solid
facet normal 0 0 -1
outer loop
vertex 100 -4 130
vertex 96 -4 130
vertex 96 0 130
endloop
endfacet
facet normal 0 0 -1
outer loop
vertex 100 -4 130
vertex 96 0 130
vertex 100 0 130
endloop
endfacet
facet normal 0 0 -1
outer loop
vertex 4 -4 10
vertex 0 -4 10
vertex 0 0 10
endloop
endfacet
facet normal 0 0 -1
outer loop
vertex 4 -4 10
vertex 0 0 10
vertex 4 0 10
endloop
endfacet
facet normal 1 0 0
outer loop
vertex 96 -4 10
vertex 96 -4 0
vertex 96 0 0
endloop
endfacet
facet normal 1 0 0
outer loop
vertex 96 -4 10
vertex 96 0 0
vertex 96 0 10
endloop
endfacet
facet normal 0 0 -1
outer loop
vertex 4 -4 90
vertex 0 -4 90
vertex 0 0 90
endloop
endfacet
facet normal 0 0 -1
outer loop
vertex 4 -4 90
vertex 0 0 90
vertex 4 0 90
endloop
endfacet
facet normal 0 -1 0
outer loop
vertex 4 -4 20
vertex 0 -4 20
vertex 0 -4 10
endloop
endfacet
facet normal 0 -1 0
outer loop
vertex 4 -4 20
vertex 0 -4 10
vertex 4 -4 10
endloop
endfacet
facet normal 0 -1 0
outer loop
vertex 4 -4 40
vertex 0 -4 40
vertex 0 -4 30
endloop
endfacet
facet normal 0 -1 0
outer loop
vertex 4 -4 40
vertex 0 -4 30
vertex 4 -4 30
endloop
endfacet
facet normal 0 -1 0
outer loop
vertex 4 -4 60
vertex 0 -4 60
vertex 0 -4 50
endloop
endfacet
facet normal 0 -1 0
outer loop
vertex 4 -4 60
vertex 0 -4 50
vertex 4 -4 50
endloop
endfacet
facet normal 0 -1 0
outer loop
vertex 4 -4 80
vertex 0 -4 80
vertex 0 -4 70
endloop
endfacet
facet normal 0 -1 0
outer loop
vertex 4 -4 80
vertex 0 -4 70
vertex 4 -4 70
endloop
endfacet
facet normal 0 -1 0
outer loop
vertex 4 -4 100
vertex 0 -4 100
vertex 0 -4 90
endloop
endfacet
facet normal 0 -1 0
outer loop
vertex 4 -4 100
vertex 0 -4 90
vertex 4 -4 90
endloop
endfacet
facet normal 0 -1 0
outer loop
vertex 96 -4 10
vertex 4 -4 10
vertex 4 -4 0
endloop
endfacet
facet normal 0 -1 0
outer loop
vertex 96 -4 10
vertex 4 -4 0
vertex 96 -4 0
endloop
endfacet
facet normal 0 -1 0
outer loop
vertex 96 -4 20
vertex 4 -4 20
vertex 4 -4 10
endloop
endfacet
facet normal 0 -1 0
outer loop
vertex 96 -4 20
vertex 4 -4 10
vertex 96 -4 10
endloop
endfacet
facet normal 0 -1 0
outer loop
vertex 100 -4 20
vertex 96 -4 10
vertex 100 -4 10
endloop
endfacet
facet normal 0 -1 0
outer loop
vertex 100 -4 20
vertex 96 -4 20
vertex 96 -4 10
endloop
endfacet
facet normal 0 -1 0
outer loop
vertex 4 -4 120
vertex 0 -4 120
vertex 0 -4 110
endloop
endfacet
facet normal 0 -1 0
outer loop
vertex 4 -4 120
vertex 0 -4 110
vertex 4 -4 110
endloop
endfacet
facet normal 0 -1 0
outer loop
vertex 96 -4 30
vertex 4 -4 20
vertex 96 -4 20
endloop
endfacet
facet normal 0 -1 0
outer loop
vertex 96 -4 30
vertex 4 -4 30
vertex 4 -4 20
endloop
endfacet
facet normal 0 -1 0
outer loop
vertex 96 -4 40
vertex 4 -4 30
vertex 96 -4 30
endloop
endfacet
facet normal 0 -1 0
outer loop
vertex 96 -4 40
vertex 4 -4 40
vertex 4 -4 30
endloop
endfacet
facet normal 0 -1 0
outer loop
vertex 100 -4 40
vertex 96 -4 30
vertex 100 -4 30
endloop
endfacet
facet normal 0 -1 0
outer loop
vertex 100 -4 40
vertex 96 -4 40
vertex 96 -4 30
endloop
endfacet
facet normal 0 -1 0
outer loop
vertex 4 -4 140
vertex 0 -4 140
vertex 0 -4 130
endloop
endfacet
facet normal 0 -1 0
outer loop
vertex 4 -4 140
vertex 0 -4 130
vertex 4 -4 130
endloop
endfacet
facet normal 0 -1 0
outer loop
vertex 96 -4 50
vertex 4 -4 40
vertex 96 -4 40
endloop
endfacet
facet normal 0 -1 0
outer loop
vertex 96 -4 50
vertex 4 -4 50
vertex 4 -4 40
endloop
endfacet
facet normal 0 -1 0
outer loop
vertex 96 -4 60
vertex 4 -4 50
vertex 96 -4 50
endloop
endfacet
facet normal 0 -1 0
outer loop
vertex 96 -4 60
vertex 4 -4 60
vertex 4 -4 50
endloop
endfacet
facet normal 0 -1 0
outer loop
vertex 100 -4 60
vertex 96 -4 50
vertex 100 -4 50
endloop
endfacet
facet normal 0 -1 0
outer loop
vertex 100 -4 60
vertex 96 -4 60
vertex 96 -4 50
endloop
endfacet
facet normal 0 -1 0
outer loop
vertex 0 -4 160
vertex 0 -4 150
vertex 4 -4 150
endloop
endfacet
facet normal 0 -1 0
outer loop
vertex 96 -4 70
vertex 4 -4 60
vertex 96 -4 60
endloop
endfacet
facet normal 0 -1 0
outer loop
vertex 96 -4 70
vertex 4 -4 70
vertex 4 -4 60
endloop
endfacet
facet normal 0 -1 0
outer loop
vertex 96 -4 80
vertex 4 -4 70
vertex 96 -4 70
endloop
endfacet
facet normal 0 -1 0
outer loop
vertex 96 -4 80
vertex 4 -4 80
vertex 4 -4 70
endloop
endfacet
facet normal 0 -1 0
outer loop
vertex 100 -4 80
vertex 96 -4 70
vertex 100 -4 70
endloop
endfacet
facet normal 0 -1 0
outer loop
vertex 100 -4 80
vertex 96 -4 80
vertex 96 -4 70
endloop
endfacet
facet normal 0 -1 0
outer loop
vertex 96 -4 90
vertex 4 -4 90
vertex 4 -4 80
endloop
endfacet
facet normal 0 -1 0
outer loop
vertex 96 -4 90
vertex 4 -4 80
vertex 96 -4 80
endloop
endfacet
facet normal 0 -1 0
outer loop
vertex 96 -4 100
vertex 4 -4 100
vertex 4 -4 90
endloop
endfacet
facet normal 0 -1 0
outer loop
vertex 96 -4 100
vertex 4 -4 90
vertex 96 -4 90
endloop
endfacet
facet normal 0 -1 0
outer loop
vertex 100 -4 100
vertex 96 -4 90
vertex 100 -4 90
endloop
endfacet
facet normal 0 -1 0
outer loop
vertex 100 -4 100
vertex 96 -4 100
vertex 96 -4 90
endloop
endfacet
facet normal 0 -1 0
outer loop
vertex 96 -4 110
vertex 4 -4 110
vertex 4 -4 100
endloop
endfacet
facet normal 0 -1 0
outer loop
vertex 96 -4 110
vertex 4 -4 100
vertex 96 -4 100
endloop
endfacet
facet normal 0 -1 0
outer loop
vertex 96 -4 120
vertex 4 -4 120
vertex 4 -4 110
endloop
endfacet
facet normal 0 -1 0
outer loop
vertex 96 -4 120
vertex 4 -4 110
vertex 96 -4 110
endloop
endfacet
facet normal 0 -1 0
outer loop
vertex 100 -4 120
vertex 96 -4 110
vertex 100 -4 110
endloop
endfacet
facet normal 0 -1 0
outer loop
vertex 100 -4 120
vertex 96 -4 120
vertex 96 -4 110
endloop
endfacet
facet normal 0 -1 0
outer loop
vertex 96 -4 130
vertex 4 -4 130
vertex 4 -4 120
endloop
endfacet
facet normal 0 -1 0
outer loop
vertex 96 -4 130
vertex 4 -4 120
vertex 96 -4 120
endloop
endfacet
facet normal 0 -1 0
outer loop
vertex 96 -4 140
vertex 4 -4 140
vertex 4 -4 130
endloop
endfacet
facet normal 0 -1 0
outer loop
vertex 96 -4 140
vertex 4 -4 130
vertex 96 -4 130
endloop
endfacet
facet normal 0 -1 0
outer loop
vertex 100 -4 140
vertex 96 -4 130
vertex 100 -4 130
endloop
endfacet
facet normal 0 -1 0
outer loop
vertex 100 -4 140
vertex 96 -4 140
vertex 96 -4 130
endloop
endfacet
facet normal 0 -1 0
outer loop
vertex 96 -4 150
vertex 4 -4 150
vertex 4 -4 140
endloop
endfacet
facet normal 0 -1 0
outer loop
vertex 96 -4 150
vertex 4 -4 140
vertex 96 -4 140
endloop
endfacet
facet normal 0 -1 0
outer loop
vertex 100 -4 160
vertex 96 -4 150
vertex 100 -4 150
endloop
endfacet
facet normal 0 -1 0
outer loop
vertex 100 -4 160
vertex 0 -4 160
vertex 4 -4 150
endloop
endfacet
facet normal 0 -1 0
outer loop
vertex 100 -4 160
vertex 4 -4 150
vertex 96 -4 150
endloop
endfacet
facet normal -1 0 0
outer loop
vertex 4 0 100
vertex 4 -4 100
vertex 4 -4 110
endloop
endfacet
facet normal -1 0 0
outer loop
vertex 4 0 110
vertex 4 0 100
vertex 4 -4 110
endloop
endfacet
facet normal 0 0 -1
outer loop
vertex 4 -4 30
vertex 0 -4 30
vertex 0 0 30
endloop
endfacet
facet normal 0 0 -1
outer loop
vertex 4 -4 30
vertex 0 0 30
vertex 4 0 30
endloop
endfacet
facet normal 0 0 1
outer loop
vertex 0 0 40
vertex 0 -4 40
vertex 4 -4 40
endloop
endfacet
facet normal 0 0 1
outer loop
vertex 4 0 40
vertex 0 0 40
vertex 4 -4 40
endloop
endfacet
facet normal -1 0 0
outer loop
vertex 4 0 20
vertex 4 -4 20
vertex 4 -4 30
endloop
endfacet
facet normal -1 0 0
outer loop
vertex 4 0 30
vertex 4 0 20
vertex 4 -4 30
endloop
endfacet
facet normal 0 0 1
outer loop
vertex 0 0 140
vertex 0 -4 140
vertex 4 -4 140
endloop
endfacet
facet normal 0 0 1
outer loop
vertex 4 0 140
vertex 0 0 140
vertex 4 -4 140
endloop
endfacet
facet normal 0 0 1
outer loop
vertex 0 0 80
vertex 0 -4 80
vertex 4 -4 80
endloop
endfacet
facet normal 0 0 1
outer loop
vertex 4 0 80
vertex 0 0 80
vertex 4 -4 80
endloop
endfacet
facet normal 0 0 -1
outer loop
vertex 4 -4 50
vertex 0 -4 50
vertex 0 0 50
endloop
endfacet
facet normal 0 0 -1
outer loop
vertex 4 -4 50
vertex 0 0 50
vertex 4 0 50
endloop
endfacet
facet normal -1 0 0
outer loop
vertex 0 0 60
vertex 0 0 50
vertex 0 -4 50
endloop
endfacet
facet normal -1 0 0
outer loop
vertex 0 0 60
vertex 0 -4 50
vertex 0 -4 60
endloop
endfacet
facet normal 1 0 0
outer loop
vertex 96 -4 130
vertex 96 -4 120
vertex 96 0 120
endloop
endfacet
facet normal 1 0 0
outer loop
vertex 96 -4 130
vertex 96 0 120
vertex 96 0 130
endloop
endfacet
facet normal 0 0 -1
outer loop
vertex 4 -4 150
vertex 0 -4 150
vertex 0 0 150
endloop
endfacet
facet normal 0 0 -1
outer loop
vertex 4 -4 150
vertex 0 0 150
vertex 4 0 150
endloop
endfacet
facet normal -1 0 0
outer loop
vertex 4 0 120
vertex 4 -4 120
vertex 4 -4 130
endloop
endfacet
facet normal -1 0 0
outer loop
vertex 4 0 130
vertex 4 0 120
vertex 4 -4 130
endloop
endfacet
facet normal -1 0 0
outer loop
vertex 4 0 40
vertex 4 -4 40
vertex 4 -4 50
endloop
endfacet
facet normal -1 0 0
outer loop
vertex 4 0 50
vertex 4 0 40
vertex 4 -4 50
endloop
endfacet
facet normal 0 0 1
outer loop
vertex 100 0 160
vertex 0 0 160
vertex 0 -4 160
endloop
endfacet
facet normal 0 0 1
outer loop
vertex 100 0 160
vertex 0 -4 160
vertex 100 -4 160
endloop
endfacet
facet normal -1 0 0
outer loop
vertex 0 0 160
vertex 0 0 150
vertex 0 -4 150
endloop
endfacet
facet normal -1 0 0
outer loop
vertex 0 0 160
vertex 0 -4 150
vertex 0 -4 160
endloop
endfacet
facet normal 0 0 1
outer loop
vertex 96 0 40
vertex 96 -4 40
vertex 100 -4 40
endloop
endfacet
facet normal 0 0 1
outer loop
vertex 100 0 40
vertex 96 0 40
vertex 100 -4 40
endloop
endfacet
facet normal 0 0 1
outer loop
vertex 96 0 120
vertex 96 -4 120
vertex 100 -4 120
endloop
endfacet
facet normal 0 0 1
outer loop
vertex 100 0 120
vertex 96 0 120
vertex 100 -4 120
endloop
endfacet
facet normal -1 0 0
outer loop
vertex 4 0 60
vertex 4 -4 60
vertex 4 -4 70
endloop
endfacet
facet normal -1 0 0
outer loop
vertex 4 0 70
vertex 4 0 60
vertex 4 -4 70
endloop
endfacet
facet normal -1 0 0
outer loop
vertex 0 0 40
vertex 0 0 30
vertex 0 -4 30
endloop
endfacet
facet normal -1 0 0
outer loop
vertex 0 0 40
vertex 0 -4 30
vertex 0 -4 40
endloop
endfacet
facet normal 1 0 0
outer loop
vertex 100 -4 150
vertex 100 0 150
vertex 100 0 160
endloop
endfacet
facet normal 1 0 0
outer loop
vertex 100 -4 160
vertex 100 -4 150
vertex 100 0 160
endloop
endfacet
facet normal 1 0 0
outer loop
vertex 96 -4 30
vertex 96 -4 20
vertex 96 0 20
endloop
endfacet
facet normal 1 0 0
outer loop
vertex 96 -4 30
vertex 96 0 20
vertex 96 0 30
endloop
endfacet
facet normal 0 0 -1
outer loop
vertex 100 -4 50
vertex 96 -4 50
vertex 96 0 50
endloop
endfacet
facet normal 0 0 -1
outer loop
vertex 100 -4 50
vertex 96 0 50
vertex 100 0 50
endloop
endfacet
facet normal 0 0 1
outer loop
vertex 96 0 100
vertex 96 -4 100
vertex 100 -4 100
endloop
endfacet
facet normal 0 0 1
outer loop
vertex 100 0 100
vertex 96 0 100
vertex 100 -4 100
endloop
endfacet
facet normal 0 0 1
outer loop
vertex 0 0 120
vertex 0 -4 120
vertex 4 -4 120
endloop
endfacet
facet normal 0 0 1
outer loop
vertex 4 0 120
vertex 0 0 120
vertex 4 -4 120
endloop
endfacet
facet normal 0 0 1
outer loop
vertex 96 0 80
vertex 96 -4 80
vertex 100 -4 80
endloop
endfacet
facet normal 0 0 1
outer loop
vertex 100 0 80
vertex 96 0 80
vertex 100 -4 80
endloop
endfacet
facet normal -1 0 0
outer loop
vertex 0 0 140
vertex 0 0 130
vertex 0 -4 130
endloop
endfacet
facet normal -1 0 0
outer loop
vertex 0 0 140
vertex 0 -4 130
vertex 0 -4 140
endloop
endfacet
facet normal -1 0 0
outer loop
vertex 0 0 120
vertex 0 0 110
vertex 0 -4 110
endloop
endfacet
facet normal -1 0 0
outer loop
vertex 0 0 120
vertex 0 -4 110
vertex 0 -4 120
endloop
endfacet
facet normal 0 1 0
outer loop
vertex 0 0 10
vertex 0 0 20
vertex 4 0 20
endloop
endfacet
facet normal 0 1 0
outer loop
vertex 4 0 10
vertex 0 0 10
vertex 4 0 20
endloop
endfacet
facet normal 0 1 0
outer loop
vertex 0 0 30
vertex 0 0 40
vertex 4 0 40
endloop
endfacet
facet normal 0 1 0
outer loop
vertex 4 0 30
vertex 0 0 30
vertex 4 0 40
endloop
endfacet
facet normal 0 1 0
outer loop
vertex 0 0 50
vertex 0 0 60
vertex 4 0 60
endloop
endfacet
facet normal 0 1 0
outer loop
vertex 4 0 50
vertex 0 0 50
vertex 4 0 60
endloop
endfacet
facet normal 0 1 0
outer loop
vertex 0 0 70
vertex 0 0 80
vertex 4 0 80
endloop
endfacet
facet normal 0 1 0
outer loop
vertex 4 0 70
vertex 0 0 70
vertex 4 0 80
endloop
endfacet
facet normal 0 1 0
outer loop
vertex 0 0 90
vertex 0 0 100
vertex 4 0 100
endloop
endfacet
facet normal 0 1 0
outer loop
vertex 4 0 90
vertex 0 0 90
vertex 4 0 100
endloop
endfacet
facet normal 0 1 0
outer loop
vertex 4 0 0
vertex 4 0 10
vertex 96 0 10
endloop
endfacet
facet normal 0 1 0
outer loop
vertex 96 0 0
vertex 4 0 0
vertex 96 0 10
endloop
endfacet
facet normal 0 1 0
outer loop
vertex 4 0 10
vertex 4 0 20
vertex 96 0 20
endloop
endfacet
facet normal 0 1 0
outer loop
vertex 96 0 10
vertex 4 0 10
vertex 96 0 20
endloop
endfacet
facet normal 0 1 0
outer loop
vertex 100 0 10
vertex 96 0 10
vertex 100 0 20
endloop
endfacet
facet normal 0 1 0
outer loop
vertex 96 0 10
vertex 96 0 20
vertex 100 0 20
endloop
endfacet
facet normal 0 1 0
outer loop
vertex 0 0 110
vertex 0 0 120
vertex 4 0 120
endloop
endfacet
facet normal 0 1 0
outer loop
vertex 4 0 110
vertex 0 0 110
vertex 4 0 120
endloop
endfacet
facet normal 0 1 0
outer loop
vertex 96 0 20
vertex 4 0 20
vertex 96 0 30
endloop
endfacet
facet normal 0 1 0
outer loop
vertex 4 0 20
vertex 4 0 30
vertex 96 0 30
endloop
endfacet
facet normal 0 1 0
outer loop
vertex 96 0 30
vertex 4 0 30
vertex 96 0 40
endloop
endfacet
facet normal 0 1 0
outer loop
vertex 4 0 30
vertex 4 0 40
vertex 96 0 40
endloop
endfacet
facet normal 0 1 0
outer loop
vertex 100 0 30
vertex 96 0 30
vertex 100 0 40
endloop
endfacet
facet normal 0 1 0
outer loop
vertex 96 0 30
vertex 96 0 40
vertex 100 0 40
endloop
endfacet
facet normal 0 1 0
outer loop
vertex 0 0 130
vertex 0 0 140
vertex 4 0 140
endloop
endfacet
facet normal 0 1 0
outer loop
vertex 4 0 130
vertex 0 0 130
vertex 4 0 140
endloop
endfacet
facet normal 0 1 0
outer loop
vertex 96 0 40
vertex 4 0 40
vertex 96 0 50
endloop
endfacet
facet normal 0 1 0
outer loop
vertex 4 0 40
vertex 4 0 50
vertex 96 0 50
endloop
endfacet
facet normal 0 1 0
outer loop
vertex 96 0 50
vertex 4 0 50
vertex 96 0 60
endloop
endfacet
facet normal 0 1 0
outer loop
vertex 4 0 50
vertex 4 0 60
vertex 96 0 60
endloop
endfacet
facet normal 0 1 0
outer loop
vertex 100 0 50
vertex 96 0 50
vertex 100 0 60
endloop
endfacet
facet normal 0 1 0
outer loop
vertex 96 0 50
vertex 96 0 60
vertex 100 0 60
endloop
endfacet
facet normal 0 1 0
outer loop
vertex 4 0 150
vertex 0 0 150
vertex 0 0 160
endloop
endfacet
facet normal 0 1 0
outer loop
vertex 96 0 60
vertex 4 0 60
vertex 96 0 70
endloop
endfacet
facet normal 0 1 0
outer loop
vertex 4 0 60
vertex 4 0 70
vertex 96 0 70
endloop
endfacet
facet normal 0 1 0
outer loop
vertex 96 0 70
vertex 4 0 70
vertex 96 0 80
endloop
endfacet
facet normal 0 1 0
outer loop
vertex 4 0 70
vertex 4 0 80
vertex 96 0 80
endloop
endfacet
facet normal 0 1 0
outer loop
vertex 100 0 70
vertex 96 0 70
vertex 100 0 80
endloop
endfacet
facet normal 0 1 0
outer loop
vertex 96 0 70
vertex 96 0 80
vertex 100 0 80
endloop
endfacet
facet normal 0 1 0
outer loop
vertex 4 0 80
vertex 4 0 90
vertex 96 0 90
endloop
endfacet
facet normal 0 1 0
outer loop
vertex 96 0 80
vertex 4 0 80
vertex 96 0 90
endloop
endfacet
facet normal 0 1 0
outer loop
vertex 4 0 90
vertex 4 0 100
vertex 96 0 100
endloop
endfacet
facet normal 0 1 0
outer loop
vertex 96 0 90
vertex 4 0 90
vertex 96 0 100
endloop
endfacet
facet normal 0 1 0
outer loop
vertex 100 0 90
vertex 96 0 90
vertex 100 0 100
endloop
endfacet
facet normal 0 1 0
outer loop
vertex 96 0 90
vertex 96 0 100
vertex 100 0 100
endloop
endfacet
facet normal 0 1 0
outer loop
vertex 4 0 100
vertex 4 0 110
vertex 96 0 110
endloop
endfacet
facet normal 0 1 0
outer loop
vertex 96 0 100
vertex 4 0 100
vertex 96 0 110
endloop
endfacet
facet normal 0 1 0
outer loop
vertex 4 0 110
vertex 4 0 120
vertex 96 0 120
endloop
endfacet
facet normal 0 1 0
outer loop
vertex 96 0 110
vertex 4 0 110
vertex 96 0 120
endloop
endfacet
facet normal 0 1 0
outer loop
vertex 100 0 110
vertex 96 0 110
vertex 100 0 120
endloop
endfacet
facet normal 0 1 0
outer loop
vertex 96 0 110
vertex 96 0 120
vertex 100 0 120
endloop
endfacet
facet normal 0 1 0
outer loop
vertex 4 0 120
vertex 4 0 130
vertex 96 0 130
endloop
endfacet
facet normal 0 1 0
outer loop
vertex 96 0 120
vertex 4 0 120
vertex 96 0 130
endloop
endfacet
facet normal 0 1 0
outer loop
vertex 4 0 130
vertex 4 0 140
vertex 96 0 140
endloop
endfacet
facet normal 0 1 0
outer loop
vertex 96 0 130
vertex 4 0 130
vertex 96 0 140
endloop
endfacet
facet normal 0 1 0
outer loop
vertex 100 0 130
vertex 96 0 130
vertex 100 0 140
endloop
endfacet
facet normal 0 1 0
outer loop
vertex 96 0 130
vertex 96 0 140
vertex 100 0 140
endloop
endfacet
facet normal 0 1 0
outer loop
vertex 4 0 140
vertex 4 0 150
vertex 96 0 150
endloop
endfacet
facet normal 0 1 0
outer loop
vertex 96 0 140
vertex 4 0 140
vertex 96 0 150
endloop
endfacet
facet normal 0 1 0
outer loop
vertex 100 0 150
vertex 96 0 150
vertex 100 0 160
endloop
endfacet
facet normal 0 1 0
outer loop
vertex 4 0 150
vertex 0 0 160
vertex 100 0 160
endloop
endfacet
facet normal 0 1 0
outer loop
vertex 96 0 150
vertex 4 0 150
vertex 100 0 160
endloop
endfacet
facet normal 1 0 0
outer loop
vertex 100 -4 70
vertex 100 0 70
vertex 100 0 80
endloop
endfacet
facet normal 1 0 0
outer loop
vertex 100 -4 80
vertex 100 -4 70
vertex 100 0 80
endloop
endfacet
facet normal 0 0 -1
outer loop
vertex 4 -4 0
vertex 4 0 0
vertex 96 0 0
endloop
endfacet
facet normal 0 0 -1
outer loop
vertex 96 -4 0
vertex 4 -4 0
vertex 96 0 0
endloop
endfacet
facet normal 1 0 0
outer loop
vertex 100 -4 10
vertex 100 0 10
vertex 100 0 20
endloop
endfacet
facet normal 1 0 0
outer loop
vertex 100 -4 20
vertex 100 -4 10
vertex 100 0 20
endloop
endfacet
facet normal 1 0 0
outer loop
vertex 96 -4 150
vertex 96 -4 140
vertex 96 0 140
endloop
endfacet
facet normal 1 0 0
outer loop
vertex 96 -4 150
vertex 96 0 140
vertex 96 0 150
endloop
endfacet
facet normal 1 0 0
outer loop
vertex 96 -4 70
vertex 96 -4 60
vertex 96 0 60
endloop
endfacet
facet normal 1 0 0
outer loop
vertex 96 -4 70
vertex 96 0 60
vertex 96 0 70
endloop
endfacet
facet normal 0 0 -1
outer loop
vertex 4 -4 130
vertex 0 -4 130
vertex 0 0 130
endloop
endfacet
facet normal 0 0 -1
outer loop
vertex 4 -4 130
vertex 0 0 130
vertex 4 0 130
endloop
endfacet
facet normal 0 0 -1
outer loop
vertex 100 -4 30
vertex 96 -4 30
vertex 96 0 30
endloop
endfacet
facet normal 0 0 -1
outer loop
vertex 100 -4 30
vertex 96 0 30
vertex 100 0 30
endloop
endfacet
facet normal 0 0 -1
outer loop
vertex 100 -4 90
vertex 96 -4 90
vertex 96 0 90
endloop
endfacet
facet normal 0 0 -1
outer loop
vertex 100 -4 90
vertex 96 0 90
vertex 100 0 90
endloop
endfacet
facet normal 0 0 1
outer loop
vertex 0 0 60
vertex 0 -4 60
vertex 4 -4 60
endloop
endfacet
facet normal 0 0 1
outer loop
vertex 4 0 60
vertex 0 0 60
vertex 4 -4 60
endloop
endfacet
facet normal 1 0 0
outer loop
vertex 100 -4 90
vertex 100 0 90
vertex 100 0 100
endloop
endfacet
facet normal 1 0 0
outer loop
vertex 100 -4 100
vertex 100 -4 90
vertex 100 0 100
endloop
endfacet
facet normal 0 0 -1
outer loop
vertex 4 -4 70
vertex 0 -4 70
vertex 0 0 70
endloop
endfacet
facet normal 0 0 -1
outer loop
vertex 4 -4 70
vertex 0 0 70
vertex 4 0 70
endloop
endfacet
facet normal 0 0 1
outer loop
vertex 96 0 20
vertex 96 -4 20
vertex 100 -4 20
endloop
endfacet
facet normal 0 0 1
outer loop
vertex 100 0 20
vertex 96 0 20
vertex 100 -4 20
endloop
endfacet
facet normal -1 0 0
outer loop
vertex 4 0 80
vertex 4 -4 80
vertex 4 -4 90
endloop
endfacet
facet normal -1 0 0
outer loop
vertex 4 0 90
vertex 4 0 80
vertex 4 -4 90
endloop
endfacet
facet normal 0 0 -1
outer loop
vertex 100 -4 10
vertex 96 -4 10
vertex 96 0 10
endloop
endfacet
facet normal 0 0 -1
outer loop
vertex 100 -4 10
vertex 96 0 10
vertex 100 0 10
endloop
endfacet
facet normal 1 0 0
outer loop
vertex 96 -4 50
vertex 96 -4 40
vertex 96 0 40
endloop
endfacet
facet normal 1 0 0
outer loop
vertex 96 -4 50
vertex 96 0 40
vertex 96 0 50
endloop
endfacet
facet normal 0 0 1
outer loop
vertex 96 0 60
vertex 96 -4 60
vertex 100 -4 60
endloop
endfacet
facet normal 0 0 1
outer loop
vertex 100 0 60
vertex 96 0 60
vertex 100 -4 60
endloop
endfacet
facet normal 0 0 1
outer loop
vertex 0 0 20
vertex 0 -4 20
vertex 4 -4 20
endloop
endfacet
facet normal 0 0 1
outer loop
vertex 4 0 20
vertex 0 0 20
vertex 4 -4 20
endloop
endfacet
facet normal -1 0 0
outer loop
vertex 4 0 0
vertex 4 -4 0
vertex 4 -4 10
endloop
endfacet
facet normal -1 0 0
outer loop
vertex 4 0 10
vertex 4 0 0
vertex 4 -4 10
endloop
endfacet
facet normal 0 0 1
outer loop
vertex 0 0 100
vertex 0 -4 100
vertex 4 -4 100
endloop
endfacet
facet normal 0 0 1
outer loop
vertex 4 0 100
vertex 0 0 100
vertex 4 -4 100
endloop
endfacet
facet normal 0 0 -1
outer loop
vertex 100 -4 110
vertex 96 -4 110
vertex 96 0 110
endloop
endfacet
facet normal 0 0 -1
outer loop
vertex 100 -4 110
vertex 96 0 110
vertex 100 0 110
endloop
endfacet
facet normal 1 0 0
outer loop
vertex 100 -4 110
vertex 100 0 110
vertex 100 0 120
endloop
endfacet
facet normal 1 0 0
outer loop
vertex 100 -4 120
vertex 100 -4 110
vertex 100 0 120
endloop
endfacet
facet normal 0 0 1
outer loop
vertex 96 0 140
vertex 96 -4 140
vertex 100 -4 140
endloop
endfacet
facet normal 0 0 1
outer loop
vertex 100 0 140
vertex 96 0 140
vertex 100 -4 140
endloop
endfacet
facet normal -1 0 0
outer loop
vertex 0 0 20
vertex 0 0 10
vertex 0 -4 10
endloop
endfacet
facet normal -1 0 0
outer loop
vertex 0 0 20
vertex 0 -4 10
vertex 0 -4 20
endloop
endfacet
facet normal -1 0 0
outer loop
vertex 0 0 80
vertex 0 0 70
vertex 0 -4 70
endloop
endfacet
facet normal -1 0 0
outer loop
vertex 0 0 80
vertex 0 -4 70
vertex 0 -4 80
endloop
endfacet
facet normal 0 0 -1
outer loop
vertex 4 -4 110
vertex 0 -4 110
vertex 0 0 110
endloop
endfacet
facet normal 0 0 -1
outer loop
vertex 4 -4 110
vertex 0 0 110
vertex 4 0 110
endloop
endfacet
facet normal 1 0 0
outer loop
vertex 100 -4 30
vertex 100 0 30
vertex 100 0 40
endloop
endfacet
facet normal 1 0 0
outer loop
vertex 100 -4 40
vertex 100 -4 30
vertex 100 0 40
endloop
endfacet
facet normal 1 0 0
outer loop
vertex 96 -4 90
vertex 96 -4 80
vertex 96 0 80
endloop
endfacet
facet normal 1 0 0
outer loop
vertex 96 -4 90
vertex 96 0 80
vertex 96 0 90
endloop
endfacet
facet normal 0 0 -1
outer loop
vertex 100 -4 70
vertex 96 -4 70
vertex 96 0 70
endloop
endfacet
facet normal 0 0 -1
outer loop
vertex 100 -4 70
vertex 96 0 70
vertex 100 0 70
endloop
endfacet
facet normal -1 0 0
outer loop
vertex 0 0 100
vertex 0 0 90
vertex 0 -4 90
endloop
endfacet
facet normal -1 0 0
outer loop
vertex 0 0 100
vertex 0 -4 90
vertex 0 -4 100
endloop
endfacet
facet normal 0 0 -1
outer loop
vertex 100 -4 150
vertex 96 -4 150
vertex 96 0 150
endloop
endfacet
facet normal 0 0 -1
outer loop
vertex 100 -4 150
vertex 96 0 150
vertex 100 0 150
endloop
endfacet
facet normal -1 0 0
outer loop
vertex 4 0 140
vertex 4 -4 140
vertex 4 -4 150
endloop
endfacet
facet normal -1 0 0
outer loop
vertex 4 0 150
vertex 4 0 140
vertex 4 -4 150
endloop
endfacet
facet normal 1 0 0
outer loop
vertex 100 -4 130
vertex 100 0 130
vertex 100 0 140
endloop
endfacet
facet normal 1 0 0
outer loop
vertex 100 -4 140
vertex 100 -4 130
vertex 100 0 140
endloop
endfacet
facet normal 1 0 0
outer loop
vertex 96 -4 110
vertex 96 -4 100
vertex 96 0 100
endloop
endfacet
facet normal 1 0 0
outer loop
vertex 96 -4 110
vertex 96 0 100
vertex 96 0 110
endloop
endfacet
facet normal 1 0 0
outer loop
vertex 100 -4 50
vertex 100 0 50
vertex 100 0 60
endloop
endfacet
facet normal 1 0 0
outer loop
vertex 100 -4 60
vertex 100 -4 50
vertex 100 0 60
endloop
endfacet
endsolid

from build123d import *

# Parameters (mm, degrees)
F0_W     = 100
F0_H     = 160
F1_DEPTH = 4
F2_W     = 4
F2_H     = 10
F3_DEPTH = 4


with BuildPart() as f1:
    # F0 (on Front) → F1 (new body)
    with BuildSketch(Plane.XZ):
        with Locations((50, 80)):
            Rectangle(F0_W, F0_H)
    extrude(amount=F1_DEPTH)

    # F2 (on face) → F3 (cut, through all)
    with BuildSketch(Plane.XZ.offset(4)):
        with Locations((2, 5)):
            Rectangle(F2_W, F2_H)
        with Locations((2, 25)):
            Rectangle(F2_W, F2_H)
        with Locations((2, 45)):
            Rectangle(F2_W, F2_H)
        with Locations((2, 65)):
            Rectangle(F2_W, F2_H)
        with Locations((2, 85)):
            Rectangle(F2_W, F2_H)
        with Locations((2, 105)):
            Rectangle(F2_W, F2_H)
        with Locations((2, 125)):
            Rectangle(F2_W, F2_H)
        with Locations((2, 145)):
            Rectangle(F2_W, F2_H)
        with Locations((98, 5)):
            Rectangle(F2_W, F2_H)
        with Locations((98, 125)):
            Rectangle(F2_W, F2_H)
        with Locations((98, 105)):
            Rectangle(F2_W, F2_H)
        with Locations((98, 145)):
            Rectangle(F2_W, F2_H)
        with Locations((98, 25)):
            Rectangle(F2_W, F2_H)
        with Locations((98, 65)):
            Rectangle(F2_W, F2_H)
        with Locations((98, 85)):
            Rectangle(F2_W, F2_H)
        with Locations((98, 45)):
            Rectangle(F2_W, F2_H)
    extrude(amount=-F3_DEPTH, mode=Mode.SUBTRACT)


solid = f1.part
